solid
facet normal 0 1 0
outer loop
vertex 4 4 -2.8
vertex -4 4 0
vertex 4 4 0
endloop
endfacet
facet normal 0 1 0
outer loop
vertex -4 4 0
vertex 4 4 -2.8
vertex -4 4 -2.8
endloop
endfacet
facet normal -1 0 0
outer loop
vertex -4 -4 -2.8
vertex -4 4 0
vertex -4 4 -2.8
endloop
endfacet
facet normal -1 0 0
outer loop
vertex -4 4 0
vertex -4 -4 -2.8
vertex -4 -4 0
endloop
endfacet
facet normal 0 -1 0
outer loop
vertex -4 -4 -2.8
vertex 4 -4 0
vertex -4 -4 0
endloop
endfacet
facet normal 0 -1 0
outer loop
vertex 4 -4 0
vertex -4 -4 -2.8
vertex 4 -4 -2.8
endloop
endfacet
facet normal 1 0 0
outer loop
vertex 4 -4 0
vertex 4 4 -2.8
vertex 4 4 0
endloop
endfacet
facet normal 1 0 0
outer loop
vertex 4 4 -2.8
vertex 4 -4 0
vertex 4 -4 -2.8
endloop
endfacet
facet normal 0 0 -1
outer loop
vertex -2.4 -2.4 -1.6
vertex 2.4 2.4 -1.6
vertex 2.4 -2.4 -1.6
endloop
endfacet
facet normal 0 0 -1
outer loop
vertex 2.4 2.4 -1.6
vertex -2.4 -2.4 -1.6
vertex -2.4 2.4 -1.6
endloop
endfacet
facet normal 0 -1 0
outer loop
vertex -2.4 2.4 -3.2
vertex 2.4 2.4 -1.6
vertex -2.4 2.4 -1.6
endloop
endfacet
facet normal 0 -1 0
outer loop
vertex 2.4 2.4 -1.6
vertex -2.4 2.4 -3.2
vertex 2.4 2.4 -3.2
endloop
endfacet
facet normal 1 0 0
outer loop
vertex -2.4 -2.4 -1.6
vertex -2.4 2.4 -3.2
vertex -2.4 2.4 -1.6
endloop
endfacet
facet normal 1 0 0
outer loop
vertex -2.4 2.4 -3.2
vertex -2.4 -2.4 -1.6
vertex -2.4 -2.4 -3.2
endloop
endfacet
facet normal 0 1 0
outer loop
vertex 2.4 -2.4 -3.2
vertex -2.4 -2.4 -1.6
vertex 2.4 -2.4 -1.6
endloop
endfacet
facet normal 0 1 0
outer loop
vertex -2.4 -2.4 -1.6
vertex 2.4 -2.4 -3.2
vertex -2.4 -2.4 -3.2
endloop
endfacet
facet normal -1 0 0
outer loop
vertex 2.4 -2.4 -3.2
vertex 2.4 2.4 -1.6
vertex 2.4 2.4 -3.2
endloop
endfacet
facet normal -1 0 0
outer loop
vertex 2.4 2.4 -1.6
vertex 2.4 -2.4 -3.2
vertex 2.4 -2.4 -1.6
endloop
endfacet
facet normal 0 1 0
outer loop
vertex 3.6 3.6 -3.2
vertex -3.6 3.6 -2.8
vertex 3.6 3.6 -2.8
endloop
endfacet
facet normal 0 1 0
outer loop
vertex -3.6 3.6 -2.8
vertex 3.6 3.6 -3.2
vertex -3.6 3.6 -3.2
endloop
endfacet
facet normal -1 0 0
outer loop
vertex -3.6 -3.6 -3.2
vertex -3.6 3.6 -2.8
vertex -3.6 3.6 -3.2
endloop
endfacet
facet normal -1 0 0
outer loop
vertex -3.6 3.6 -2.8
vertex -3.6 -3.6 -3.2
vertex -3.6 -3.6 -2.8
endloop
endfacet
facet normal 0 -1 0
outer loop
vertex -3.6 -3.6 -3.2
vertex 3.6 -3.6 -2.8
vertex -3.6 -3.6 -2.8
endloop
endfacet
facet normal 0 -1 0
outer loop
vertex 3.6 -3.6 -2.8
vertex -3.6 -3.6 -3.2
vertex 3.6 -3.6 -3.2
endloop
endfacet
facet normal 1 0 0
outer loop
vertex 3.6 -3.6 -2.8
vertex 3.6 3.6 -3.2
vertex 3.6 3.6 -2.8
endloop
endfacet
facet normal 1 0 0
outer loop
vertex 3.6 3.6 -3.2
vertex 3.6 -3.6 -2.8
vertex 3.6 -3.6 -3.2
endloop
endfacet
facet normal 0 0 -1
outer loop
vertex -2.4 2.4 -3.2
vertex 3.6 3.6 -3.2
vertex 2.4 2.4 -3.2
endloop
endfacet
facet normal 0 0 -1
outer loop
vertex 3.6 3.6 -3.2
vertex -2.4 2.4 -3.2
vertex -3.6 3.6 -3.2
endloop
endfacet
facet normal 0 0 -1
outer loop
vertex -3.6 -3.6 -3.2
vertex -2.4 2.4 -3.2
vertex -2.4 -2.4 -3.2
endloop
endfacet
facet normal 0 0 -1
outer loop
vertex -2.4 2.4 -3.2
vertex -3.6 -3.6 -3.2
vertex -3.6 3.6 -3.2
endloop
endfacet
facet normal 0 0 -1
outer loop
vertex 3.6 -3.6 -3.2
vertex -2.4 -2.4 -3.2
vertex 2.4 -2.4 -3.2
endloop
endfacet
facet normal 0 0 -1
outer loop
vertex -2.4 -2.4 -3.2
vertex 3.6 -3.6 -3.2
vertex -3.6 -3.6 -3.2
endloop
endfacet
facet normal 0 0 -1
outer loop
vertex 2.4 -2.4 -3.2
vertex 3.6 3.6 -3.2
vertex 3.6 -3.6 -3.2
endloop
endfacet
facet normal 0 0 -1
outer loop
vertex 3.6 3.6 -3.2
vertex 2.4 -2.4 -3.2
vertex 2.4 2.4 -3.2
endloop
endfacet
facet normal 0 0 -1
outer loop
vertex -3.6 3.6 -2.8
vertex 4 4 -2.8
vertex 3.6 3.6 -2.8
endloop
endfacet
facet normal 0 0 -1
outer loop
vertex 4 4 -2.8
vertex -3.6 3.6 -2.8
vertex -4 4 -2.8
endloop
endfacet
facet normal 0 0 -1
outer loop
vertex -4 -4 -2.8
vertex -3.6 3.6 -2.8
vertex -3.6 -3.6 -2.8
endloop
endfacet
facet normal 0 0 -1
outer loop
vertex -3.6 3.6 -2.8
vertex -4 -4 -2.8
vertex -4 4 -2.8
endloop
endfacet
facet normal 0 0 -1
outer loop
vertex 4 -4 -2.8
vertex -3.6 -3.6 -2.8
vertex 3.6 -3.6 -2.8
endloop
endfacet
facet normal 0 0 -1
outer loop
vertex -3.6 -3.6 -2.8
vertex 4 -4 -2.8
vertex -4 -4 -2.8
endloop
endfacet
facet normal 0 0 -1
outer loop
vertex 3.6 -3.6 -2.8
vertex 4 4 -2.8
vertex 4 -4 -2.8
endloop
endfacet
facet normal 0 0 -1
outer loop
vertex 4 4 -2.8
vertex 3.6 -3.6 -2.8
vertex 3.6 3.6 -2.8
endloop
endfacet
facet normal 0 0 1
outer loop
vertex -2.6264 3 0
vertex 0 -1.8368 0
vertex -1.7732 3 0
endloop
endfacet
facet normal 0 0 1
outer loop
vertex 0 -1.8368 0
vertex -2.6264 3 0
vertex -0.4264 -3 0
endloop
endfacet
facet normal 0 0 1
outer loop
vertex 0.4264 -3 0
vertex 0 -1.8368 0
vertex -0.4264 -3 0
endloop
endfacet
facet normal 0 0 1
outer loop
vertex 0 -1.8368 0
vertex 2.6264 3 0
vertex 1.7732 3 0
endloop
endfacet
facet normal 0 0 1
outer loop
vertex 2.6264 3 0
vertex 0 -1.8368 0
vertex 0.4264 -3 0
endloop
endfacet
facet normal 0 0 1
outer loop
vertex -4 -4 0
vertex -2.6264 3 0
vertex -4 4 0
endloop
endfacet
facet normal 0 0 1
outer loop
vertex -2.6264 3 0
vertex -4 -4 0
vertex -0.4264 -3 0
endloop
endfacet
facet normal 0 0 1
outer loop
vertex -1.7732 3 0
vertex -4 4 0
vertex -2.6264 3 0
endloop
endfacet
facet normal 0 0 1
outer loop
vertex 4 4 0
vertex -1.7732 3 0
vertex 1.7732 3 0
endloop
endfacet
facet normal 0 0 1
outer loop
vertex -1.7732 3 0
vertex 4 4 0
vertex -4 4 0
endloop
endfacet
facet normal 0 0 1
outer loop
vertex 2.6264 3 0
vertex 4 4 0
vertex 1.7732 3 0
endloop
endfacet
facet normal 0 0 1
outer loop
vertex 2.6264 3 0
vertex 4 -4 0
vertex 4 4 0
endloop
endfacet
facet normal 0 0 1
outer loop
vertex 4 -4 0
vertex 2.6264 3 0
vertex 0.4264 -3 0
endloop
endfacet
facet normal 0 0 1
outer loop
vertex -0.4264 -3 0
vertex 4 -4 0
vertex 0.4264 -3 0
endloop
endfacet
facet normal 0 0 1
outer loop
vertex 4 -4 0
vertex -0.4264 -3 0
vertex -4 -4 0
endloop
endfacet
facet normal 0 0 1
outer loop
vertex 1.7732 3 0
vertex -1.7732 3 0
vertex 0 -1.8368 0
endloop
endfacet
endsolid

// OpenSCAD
// file: ../p/box5.scad
use <../lib.scad>
function ldraw_lib__box5() = [
// 0 Box with 5 Faces and All Edges
// 0 Name: box5.dat
// 0 Author: James Jessiman
// 0 !LDRAW_ORG Primitive UPDATE 2012-01
// 0 !LICENSE Licensed under CC BY 4.0 : see CAreadme.txt
// 
// 0 BFC CERTIFY CCW
  [0,"BFC","CERTIFY"],
  [0,"BFC","CCW"],
// 
// 0 !HISTORY 2002-04-03 [sbliss] Modified for BFC compliance
// 0 !HISTORY 2002-04-25 [PTadmin] Official Update 2002-02
// 0 !HISTORY 2007-06-24 [PTadmin] Header formatted for Contributor Agreement
// 0 !HISTORY 2008-07-01 [PTadmin] Official Update 2008-01
// 0 !HISTORY 2012-02-16 [Philo] Changed to CCW
// 0 !HISTORY 2012-03-30 [PTadmin] Official Update 2012-01
// 
// 
// 2 24 1 1 1 -1 1 1
  [2,24,1,1,1,-1,1,1],
// 2 24 -1 1 1 -1 1 -1
  [2,24,-1,1,1,-1,1,-1],
// 2 24 -1 1 -1 1 1 -1
  [2,24,-1,1,-1,1,1,-1],
// 2 24 1 1 -1 1 1 1
  [2,24,1,1,-1,1,1,1],
// 2 24 1 0 1 -1 0 1
  [2,24,1,0,1,-1,0,1],
// 2 24 -1 0 1 -1 0 -1
  [2,24,-1,0,1,-1,0,-1],
// 2 24 -1 0 -1 1 0 -1
  [2,24,-1,0,-1,1,0,-1],
// 2 24 1 0 -1 1 0 1
  [2,24,1,0,-1,1,0,1],
// 2 24 1 0 1 1 1 1
  [2,24,1,0,1,1,1,1],
// 2 24 -1 0 1 -1 1 1
  [2,24,-1,0,1,-1,1,1],
// 2 24 1 0 -1 1 1 -1
  [2,24,1,0,-1,1,1,-1],
// 2 24 -1 0 -1 -1 1 -1
  [2,24,-1,0,-1,-1,1,-1],
// 4 16 -1 1 1 1 1 1 1 1 -1 -1 1 -1
  [4,16,-1,1,1,1,1,1,1,1,-1,-1,1,-1],
// 4 16 -1 1 1 -1 0 1 1 0 1 1 1 1
  [4,16,-1,1,1,-1,0,1,1,0,1,1,1,1],
// 4 16 -1 1 -1 -1 0 -1 -1 0 1 -1 1 1
  [4,16,-1,1,-1,-1,0,-1,-1,0,1,-1,1,1],
// 4 16 1 1 -1 1 0 -1 -1 0 -1 -1 1 -1
  [4,16,1,1,-1,1,0,-1,-1,0,-1,-1,1,-1],
// 4 16 1 1 1 1 0 1 1 0 -1 1 1 -1
  [4,16,1,1,1,1,0,1,1,0,-1,1,1,-1],
];
module ldraw_lib__box5(step=0, col=false, unit=2/5, alt=false, line=0.2, solid=!$preview)
    makepoly(ldraw_lib__box5(), step=step, col=col, unit=unit, alt=alt, line=line, solid=solid);
ldraw_lib__box5(line=0.2);
// file: ../p/box4.scad
use <../lib.scad>
function ldraw_lib__box4() = [
// 0 Box with 4 Faces (2 Parallel Pairs) and All Edges
// 0 Name: box4.dat
// 0 Author: James Jessiman
// 0 !LDRAW_ORG Primitive UPDATE 2012-01
// 0 !LICENSE Licensed under CC BY 4.0 : see CAreadme.txt
// 
// 0 BFC CERTIFY CCW
  [0,"BFC","CERTIFY"],
  [0,"BFC","CCW"],
// 
// 0 !HISTORY 2002-04-03 [sbliss] Modified for BFC compliance
// 0 !HISTORY 2002-04-25 [PTadmin] Official Update 2002-02
// 0 !HISTORY 2007-06-24 [PTadmin] Header formatted for Contributor Agreement
// 0 !HISTORY 2008-07-01 [PTadmin] Official Update 2008-01
// 0 !HISTORY 2012-02-16 [Philo] Changed to CCW
// 0 !HISTORY 2012-03-30 [PTadmin] Official Update 2012-01
// 
// 
// 2 24 1 1 1 -1 1 1
  [2,24,1,1,1,-1,1,1],
// 2 24 -1 1 1 -1 1 -1
  [2,24,-1,1,1,-1,1,-1],
// 2 24 -1 1 -1 1 1 -1
  [2,24,-1,1,-1,1,1,-1],
// 2 24 1 1 -1 1 1 1
  [2,24,1,1,-1,1,1,1],
// 2 24 1 0 1 -1 0 1
  [2,24,1,0,1,-1,0,1],
// 2 24 -1 0 1 -1 0 -1
  [2,24,-1,0,1,-1,0,-1],
// 2 24 -1 0 -1 1 0 -1
  [2,24,-1,0,-1,1,0,-1],
// 2 24 1 0 -1 1 0 1
  [2,24,1,0,-1,1,0,1],
// 2 24 1 0 1 1 1 1
  [2,24,1,0,1,1,1,1],
// 2 24 -1 0 1 -1 1 1
  [2,24,-1,0,1,-1,1,1],
// 2 24 1 0 -1 1 1 -1
  [2,24,1,0,-1,1,1,-1],
// 2 24 -1 0 -1 -1 1 -1
  [2,24,-1,0,-1,-1,1,-1],
// 4 16 -1 1 1 -1 0 1 1 0 1 1 1 1
  [4,16,-1,1,1,-1,0,1,1,0,1,1,1,1],
// 4 16 -1 1 -1 -1 0 -1 -1 0 1 -1 1 1
  [4,16,-1,1,-1,-1,0,-1,-1,0,1,-1,1,1],
// 4 16 1 1 -1 1 0 -1 -1 0 -1 -1 1 -1
  [4,16,1,1,-1,1,0,-1,-1,0,-1,-1,1,-1],
// 4 16 1 1 1 1 0 1 1 0 -1 1 1 -1
  [4,16,1,1,1,1,0,1,1,0,-1,1,1,-1],
];
module ldraw_lib__box4(step=0, col=false, unit=2/5, alt=false, line=0.2, solid=!$preview)
    makepoly(ldraw_lib__box4(), step=step, col=col, unit=unit, alt=alt, line=line, solid=solid);
ldraw_lib__box4(line=0.2);
// file: s/3070bs01.scad
use <../../lib.scad>
use <../../p/box4.scad>
use <../../p/box5.scad>
function ldraw_lib__s__3070bs01() = [
// 0 ~Tile  1 x  1 with Groove without Top Face
// 0 Name: s\3070bs01.dat
// 0 Author: Chris Dee [cwdee]
// 0 !LDRAW_ORG Subpart UPDATE 2009-02
// 0 !LICENSE Licensed under CC BY 4.0 : see CAreadme.txt
// 
// 0 BFC CERTIFY CCW
  [0,"BFC","CERTIFY"],
  [0,"BFC","CCW"],
// 
// 0 !HISTORY 2009-09-03 [PTadmin] Official Update 2009-02
// 
// 
// 1 16 0 0 0 10 0 0 0 7 0 0 0 10 box4.dat
  [1,16,0,0,0,10,0,0,0,7,0,0,0,10, ldraw_lib__box4()],
// 0 BFC INVERTNEXT
  [0,"BFC","INVERTNEXT"],
// 1 16 0 8 0 6 0 0 0 -4 0 0 0 6 box5.dat
  [1,16,0,8,0,6,0,0,0,-4,0,0,0,6, ldraw_lib__box5()],
// 1 16 0 7 0 9 0 0 0 1 0 0 0 9 box4.dat
  [1,16,0,7,0,9,0,0,0,1,0,0,0,9, ldraw_lib__box4()],
// 
// 4 16 9 8 9 6 8 6 -6 8 6 -9 8 9
  [4,16,9,8,9,6,8,6,-6,8,6,-9,8,9],
// 4 16 -9 8 9 -6 8 6 -6 8 -6 -9 8 -9
  [4,16,-9,8,9,-6,8,6,-6,8,-6,-9,8,-9],
// 4 16 -9 8 -9 -6 8 -6 6 8 -6 9 8 -9
  [4,16,-9,8,-9,-6,8,-6,6,8,-6,9,8,-9],
// 4 16 9 8 -9 6 8 -6 6 8 6 9 8 9
  [4,16,9,8,-9,6,8,-6,6,8,6,9,8,9],
// 
// 4 16 10 7 10 9 7 9 -9 7 9 -10 7 10
  [4,16,10,7,10,9,7,9,-9,7,9,-10,7,10],
// 4 16 -10 7 10 -9 7 9 -9 7 -9 -10 7 -10
  [4,16,-10,7,10,-9,7,9,-9,7,-9,-10,7,-10],
// 4 16 -10 7 -10 -9 7 -9 9 7 -9 10 7 -10
  [4,16,-10,7,-10,-9,7,-9,9,7,-9,10,7,-10],
// 4 16 10 7 -10 9 7 -9 9 7 9 10 7 10
  [4,16,10,7,-10,9,7,-9,9,7,9,10,7,10],
// 0
];
module ldraw_lib__s__3070bs01(step=0, col=false, unit=2/5, alt=false, line=0.2, solid=!$preview)
    makepoly(ldraw_lib__s__3070bs01(), step=step, col=col, unit=unit, alt=alt, line=line, solid=solid);
ldraw_lib__s__3070bs01(line=0.2);
// file: s/3070batv.scad
use <../../lib.scad>
function ldraw_lib__s__3070batv() = [
// 0 ~Tile  1 x  1 with "V" Pattern
// 0 Name: s\3070batv.dat
// 0 Author: Chris Dee [cwdee]
// 0 !LDRAW_ORG Subpart UPDATE 2009-01
// 0 !LICENSE Licensed under CC BY 4.0 : see CAreadme.txt
// 
// 0 BFC CERTIFY CW
  [0,"BFC","CERTIFY"],
  [0,"BFC","CW"],
// 
// 0 !HISTORY 2009-05-02 [PTadmin] Official Update 2009-01
// 
// 
// 4 16 -1.066 0 -7.5 -6.566 0 7.5 -4.433 0 7.5 0 0 -4.592
  [4,16,-1.066,0,-7.5,-6.566,0,7.5,-4.433,0,7.5,0,0,-4.592],
// 3 16 -1.066 0 -7.5 0 0 -4.592 1.066 0 -7.5
  [3,16,-1.066,0,-7.5,0,0,-4.592,1.066,0,-7.5],
// 4 16 4.433 0 7.5 6.566 0 7.5 1.066 0 -7.5 0 0 -4.592
  [4,16,4.433,0,7.5,6.566,0,7.5,1.066,0,-7.5,0,0,-4.592],
// 
// 0
];
module ldraw_lib__s__3070batv(step=0, col=false, unit=2/5, alt=false, line=0.2, solid=!$preview)
    makepoly(ldraw_lib__s__3070batv(), step=step, col=col, unit=unit, alt=alt, line=line, solid=solid);
ldraw_lib__s__3070batv(line=0.2);
// main file
use <../lib.scad>
use <s/3070batv.scad>
use <s/3070bs01.scad>
function ldraw_lib__3070bptv() = [
// 0 Tile  1 x  1 with Silver "V" Pattern
// 0 Name: 3070bptv.dat
// 0 Author: Chris Dee [cwdee]
// 0 !LDRAW_ORG Part UPDATE 2013-01
// 0 !LICENSE Licensed under CC BY 4.0 : see CAreadme.txt
// 
// 0 BFC CERTIFY CW
  [0,"BFC","CERTIFY"],
  [0,"BFC","CW"],
// 
// 0 !KEYWORDS BrickLink 3070pb030, Rebrickable 3070bpr0084, Set 4677
// 
// 0 !HISTORY 2009-05-02 [PTadmin] Official Update 2009-01
// 0 !HISTORY 2013-03-09 [MagFors] Changed colour 383 to 80 (printed silver)
// 0 !HISTORY 2013-07-21 [PTadmin] Official Update 2013-01
// 
// 
// 1 16 0 0 0 1 0 0 0 1 0 0 0 1 s\3070bs01.dat
  [1,16,0,0,0,1,0,0,0,1,0,0,0,1, ldraw_lib__s__3070bs01()],
// 1 80 0 0 0 1 0 0 0 1 0 0 0 1 s\3070batv.dat
  [1,80,0,0,0,1,0,0,0,1,0,0,0,1, ldraw_lib__s__3070batv()],
// 4 16 -1.066 0 -7.5 -10 0 -10 -10 0 10 -6.566 0 7.5
  [4,16,-1.066,0,-7.5,-10,0,-10,-10,0,10,-6.566,0,7.5],
// 3 16 -6.566 0 7.5 -10 0 10 -4.433 0 7.5
  [3,16,-6.566,0,7.5,-10,0,10,-4.433,0,7.5],
// 4 16 -4.433 0 7.5 -10 0 10 10 0 10 4.433 0 7.5
  [4,16,-4.433,0,7.5,-10,0,10,10,0,10,4.433,0,7.5],
// 3 16 4.433 0 7.5 10 0 10 6.566 0 7.5
  [3,16,4.433,0,7.5,10,0,10,6.566,0,7.5],
// 4 16 6.566 0 7.5 10 0 10 10 0 -10 1.066 0 -7.5
  [4,16,6.566,0,7.5,10,0,10,10,0,-10,1.066,0,-7.5],
// 4 16 1.066 0 -7.5 10 0 -10 -10 0 -10 -1.066 0 -7.5
  [4,16,1.066,0,-7.5,10,0,-10,-10,0,-10,-1.066,0,-7.5],
// 3 16 0 0 -4.592 -4.433 0 7.5 4.433 0 7.5
  [3,16,0,0,-4.592,-4.433,0,7.5,4.433,0,7.5],
// 
];
module ldraw_lib__3070bptv(step=0, col=false, unit=2/5, alt=false, line=0.2, solid=!$preview)
    makepoly(ldraw_lib__3070bptv(), step=step, col=col, unit=unit, alt=alt, line=line, solid=solid);
ldraw_lib__3070bptv(line=0.2);
